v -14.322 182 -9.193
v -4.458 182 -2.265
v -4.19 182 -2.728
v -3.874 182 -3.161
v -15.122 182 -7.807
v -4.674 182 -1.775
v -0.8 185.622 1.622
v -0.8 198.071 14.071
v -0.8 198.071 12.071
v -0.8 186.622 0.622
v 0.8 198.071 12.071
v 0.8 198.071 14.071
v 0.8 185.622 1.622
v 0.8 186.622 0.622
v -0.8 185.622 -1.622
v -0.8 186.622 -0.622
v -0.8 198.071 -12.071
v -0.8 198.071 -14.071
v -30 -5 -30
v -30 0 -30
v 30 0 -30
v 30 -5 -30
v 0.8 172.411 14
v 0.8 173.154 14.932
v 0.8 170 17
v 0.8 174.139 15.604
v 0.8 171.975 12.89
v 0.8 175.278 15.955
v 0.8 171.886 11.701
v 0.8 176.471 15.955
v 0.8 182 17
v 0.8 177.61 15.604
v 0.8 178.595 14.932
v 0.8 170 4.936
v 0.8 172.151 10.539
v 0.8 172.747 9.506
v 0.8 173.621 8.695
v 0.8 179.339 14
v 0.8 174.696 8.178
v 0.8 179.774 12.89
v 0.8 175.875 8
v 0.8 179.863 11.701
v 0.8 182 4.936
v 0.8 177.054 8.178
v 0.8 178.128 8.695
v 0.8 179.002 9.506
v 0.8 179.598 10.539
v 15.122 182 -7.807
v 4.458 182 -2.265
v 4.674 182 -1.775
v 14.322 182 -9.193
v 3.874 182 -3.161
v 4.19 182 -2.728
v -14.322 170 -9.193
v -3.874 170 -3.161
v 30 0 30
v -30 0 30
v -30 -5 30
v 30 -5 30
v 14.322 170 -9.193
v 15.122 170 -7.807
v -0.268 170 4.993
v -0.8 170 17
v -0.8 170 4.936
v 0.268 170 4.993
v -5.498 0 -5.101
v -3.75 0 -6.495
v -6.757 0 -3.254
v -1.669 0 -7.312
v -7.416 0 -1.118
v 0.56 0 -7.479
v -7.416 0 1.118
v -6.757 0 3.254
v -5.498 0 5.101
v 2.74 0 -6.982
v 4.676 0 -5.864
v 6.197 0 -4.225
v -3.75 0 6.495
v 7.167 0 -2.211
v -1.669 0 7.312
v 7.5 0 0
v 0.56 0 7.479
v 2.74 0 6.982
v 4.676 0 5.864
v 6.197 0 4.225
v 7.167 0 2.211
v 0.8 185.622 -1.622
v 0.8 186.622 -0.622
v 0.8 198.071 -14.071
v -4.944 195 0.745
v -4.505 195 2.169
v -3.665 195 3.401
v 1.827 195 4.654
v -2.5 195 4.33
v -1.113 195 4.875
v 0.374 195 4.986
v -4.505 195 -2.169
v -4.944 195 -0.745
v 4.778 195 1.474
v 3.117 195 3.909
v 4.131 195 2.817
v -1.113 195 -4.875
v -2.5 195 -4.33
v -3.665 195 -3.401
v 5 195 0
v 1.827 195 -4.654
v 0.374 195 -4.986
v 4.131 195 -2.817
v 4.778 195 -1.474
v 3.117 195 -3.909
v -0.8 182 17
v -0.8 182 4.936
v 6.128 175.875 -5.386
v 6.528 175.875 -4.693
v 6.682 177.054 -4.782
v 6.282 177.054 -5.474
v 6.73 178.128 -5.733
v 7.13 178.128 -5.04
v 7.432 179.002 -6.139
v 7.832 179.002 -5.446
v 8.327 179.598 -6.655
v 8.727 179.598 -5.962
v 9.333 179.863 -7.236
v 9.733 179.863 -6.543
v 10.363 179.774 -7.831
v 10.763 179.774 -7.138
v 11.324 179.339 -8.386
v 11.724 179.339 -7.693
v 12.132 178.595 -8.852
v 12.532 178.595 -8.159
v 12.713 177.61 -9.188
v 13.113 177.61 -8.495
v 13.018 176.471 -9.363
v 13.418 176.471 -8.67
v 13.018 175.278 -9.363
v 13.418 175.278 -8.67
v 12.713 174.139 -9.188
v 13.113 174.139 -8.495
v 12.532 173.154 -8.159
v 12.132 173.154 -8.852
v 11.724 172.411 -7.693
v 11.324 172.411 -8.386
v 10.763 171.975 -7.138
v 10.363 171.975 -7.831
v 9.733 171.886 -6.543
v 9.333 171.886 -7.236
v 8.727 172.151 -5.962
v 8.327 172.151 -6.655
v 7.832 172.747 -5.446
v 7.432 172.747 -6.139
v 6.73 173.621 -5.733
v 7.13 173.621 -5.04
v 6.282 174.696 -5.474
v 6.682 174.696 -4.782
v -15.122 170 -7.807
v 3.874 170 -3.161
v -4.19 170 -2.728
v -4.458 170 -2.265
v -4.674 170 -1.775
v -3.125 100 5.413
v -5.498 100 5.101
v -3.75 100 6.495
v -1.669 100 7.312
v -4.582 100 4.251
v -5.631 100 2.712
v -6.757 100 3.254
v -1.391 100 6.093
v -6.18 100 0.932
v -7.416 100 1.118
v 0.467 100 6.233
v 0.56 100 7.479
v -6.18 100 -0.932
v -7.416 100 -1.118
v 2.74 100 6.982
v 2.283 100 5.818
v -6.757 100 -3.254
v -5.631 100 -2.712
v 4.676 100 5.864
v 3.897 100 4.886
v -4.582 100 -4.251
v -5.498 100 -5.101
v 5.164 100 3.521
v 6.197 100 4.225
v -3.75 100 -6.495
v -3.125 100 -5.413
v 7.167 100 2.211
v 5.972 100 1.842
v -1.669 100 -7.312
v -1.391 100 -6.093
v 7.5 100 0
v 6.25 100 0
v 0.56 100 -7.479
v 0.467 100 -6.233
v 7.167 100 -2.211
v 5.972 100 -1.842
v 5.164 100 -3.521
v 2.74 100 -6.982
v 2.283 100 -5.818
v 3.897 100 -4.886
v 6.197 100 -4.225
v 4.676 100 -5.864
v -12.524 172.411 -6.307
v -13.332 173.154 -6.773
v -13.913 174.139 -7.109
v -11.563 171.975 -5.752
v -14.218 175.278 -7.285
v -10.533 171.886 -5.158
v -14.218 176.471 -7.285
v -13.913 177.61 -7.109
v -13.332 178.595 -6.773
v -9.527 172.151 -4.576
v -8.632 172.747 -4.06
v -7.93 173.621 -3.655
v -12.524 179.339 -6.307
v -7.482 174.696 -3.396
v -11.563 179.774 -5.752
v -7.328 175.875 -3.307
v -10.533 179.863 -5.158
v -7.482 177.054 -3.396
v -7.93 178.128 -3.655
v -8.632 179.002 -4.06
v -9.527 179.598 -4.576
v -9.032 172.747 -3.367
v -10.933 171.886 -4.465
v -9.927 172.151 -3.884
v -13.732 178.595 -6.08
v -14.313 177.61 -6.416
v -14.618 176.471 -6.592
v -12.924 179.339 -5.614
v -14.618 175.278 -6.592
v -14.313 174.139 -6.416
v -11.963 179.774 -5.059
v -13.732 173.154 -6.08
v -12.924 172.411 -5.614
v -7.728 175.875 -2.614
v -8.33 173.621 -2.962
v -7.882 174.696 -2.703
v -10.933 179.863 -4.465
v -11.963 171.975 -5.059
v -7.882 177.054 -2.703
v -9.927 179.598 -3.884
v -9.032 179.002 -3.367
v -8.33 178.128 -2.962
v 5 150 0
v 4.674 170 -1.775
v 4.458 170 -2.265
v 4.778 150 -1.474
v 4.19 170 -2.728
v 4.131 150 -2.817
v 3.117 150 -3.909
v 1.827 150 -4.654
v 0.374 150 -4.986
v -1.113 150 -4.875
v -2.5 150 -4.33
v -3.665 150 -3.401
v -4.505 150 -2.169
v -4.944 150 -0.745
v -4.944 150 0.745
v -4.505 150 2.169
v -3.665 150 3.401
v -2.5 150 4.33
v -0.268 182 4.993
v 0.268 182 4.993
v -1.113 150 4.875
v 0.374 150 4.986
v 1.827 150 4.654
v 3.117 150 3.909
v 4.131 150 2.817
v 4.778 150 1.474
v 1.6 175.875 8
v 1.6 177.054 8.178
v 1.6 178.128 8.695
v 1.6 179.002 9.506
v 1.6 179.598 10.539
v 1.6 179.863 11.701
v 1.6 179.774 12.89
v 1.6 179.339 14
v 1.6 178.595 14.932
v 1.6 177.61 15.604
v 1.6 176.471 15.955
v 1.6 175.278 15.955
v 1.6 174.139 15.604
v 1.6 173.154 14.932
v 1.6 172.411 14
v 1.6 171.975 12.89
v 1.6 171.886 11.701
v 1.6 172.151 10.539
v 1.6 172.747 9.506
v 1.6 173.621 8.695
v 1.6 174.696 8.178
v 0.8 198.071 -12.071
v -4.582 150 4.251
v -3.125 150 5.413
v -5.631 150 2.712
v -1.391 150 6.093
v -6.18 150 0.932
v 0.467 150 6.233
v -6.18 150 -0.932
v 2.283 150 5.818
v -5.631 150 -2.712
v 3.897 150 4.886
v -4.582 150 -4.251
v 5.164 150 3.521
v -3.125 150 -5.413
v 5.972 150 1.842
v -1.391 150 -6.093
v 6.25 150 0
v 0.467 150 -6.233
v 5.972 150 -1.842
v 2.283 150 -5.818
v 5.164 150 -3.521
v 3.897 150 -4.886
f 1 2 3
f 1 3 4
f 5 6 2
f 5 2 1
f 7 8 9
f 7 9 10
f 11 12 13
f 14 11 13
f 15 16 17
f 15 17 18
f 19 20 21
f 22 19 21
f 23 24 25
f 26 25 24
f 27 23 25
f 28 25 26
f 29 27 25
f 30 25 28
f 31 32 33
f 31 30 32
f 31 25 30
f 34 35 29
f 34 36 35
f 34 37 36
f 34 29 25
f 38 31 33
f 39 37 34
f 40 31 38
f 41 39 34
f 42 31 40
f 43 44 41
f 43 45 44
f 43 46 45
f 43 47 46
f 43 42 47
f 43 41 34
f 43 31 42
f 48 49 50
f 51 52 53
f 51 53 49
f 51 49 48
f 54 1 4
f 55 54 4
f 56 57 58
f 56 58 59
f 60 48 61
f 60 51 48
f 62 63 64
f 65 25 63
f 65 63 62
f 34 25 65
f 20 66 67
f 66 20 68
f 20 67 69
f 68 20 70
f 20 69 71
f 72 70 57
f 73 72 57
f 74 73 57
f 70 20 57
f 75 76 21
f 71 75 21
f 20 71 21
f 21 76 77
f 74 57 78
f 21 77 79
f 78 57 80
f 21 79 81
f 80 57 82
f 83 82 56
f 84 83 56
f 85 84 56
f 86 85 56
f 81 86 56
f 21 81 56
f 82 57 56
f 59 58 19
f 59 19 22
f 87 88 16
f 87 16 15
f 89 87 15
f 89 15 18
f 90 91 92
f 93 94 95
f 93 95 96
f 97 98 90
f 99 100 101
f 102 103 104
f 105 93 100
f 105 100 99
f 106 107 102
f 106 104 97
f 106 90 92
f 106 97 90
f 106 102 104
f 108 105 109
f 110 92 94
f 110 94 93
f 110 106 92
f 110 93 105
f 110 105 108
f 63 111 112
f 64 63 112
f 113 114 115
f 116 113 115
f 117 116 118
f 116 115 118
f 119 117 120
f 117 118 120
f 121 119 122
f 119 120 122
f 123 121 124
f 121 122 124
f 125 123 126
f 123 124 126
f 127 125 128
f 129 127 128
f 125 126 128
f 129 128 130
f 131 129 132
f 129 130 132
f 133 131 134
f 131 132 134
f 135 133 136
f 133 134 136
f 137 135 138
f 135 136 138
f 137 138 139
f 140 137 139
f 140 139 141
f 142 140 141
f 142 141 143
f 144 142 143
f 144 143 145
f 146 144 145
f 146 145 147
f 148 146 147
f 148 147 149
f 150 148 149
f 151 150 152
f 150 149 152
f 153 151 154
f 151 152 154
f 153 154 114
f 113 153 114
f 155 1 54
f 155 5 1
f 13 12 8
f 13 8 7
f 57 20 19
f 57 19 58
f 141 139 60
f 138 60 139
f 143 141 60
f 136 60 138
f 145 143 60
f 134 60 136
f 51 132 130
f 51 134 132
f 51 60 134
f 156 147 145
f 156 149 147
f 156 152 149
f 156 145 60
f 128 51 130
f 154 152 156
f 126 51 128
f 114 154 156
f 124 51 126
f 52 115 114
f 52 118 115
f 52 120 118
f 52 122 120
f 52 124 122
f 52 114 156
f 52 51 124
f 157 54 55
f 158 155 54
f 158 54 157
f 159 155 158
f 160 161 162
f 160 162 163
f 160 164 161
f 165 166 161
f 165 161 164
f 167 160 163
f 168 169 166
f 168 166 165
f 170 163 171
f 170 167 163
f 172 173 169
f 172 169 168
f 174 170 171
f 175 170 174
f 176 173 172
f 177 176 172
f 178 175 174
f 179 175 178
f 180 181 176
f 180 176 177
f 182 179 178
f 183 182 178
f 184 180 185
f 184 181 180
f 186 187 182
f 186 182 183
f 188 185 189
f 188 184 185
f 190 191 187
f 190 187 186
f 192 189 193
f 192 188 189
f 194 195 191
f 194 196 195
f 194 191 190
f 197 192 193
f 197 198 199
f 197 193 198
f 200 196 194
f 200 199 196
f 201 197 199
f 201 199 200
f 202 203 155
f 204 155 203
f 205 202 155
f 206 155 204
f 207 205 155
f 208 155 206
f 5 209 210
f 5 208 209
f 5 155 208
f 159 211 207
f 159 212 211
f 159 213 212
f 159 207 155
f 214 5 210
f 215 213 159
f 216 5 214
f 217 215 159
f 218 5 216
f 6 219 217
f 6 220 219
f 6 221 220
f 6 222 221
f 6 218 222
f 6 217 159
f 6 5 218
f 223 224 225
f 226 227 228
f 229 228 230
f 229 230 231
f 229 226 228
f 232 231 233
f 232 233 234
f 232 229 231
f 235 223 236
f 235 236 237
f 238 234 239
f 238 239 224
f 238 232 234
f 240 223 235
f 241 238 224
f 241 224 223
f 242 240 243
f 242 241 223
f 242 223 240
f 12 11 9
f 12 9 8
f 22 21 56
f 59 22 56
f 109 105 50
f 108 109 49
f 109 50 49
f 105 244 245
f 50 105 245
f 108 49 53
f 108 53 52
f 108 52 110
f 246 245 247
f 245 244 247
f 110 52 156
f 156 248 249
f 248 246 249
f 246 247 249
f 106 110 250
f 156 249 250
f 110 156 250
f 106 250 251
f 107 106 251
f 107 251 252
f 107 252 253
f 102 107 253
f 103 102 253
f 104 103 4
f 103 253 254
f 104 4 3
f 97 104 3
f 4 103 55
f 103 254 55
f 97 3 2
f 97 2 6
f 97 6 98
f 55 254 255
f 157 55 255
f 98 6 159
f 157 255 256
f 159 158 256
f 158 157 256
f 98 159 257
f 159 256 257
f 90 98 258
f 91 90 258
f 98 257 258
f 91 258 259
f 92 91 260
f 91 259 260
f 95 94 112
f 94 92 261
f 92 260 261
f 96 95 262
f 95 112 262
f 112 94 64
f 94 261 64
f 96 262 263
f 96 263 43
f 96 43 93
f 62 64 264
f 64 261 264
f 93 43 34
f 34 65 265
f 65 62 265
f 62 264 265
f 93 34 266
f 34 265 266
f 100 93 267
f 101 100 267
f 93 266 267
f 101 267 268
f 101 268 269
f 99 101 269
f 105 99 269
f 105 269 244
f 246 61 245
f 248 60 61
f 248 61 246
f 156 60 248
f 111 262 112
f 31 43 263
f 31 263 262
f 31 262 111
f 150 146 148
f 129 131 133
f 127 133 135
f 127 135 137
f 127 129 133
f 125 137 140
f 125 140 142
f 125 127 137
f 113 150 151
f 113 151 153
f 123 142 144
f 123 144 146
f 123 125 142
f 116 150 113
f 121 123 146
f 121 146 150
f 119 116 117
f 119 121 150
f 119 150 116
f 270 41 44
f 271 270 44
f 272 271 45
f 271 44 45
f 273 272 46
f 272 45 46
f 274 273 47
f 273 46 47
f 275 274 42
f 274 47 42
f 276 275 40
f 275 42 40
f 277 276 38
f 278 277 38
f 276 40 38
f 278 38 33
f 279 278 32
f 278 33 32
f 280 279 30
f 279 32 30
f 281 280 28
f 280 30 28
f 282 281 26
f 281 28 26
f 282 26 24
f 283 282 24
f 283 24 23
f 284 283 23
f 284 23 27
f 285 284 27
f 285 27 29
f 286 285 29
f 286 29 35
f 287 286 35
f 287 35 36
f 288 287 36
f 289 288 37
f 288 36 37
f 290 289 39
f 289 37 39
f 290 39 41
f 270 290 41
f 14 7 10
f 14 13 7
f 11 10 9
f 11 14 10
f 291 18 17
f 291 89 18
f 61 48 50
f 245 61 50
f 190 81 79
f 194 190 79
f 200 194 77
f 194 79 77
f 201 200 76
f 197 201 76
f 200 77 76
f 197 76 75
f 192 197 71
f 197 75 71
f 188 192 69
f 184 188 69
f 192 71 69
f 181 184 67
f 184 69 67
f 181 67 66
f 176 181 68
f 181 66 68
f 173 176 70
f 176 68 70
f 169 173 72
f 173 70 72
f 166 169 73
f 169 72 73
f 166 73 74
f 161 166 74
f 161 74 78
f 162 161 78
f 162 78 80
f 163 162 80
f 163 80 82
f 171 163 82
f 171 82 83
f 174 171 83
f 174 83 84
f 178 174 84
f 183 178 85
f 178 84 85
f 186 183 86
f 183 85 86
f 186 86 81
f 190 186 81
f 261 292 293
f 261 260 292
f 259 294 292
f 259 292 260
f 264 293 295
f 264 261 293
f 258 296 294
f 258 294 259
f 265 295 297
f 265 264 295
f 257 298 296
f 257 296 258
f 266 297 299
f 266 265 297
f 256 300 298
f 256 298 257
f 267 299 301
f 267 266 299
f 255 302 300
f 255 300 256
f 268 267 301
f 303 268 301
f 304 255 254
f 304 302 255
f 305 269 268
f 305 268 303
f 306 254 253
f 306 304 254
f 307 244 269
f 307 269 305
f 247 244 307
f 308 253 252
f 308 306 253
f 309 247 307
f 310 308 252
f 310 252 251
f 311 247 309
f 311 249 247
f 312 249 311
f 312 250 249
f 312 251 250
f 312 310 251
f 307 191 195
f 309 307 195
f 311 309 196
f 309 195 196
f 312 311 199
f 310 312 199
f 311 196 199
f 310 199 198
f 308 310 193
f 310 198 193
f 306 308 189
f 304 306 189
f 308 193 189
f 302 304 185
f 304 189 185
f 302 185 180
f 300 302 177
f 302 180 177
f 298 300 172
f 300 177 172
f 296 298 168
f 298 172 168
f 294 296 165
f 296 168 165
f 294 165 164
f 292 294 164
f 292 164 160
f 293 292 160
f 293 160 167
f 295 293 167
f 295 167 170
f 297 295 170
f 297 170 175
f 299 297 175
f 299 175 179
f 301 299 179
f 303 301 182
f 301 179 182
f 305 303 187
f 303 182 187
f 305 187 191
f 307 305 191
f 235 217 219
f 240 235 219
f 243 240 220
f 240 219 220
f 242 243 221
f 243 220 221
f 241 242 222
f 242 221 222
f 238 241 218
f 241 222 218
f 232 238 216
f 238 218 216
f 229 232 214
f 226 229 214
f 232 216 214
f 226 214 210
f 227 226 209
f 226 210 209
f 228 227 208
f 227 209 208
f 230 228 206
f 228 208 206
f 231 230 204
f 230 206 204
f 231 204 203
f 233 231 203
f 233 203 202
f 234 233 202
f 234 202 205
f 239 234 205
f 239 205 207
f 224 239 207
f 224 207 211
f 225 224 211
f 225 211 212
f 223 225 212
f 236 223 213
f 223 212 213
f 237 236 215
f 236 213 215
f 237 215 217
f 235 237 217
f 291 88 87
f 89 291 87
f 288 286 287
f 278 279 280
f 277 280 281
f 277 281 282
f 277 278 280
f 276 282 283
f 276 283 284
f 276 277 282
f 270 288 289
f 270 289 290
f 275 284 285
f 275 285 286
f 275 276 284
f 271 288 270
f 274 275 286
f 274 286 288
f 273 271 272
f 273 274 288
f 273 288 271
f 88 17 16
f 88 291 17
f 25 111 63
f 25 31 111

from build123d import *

# Parameters (mm, degrees)
SKETCH1_R                  = 7.5
BOSS_EXTRUDE1_DEPTH        = 100
SKETCH2_R                  = 6.25
BOSS_EXTRUDE2_DEPTH        = 50
SKETCH3_W                  = 60
SKETCH3_H                  = 60
BOSS_EXTRUDE3_DEPTH        = 5
SKETCH4_R                  = 5
BOSS_EXTRUDE4_DEPTH        = 45
BOSS_EXTRUDE5_DEPTH        = 0.8
SKETCH6_R                  = 4
BOSS_EXTRUDE6_DEPTH        = 0.8
CIRPATTERN2_COUNT          = 3
BOSS_EXTRUDE7_DEPTH        = 0.8
BOSS_EXTRUDE7_DEPTH_BACK   = 0.8
BOSS_EXTRUDE7_2_DEPTH      = 0.8
BOSS_EXTRUDE7_2_DEPTH_BACK = 0.8


with BuildPart() as part:
    # Sketch1 → Boss-Extrude1 (new body)
    with BuildSketch(Plane(origin=(0, 0, 0), x_dir=(1, 0, 0), z_dir=(0, 1, 0))):
        Circle(SKETCH1_R)
    extrude(amount=BOSS_EXTRUDE1_DEPTH)

    # Sketch2 → Boss-Extrude2 (add)
    with BuildSketch(Plane(origin=(0, 100, 0), x_dir=(1, 0, 0), z_dir=(0, 1, 0))):
        Circle(SKETCH2_R)
    extrude(amount=BOSS_EXTRUDE2_DEPTH)

    # Sketch3 → Boss-Extrude3 (add)
    with BuildSketch(Plane.XZ):
        Rectangle(SKETCH3_W, SKETCH3_H)
    extrude(amount=BOSS_EXTRUDE3_DEPTH)

    # Sketch4 → Boss-Extrude4 (add)
    with BuildSketch(Plane(origin=(0, 150, 0), x_dir=(1, 0, 0), z_dir=(0, 1, 0))):
        Circle(SKETCH4_R)
    extrude(amount=BOSS_EXTRUDE4_DEPTH)

    # Sketch5 → Boss-Extrude5 (add, symmetric)
    with BuildSketch(Plane(origin=(0, 0, 0), x_dir=(0, 0, -1), z_dir=(1, 0, 0))):
        Polygon((-5, 182), (-17, 182), (-17, 170), (-5, 170), (-2.5, 170), (-2.5, 182), align=None)
    boss_extrude5 = extrude(amount=BOSS_EXTRUDE5_DEPTH, both=True)

    # Sketch6 → Boss-Extrude6 (add)
    with BuildSketch(Plane(origin=(0.8, 0, 0), x_dir=(0, 0, -1), z_dir=(1, 0, 0))):
        with Locations((-12, 175.874664873)):
            Circle(SKETCH6_R)
    boss_extrude6 = extrude(amount=BOSS_EXTRUDE6_DEPTH)

    # CirPattern2: Boss-Extrude5, Boss-Extrude6 ×3 about axis
    cirpattern2_axis = Axis((0, 195, 0), (0, 1, 0))
    add([boss_extrude5.rotate(cirpattern2_axis, i * 360 / CIRPATTERN2_COUNT) for i in range(1, CIRPATTERN2_COUNT)])
    add([boss_extrude6.rotate(cirpattern2_axis, i * 360 / CIRPATTERN2_COUNT) for i in range(1, CIRPATTERN2_COUNT)])


with BuildPart() as body_2:
    # Sketch7 → Boss-Extrude7 (new, two sides: drawn at the far end of the back side and taken through both)
    with BuildSketch(Plane(origin=(0, 0, 0), x_dir=(0, 0, -1), z_dir=(1, 0, 0)).offset(-BOSS_EXTRUDE7_DEPTH_BACK)):
        Polygon((-0.622477317, 186.622477317), (-12.071067812, 198.071067812), (-14.071067812, 198.071067812), (-1.622477317, 185.622477317), align=None)
    extrude(amount=BOSS_EXTRUDE7_DEPTH + BOSS_EXTRUDE7_DEPTH_BACK)


with BuildPart() as body_3:
    # Sketch7 → Boss-Extrude7 2 (new, two sides: drawn at the far end of the back side and taken through both)
    with BuildSketch(Plane(origin=(0, 0, 0), x_dir=(0, 0, -1), z_dir=(1, 0, 0)).offset(-BOSS_EXTRUDE7_2_DEPTH_BACK)):
        Polygon((12.071067812, 198.071067812), (0.622477317, 186.622477317), (1.622477317, 185.622477317), (14.071067812, 198.071067812), align=None)
    extrude(amount=BOSS_EXTRUDE7_2_DEPTH + BOSS_EXTRUDE7_2_DEPTH_BACK)


solid = Compound([part.part, body_2.part, body_3.part])
